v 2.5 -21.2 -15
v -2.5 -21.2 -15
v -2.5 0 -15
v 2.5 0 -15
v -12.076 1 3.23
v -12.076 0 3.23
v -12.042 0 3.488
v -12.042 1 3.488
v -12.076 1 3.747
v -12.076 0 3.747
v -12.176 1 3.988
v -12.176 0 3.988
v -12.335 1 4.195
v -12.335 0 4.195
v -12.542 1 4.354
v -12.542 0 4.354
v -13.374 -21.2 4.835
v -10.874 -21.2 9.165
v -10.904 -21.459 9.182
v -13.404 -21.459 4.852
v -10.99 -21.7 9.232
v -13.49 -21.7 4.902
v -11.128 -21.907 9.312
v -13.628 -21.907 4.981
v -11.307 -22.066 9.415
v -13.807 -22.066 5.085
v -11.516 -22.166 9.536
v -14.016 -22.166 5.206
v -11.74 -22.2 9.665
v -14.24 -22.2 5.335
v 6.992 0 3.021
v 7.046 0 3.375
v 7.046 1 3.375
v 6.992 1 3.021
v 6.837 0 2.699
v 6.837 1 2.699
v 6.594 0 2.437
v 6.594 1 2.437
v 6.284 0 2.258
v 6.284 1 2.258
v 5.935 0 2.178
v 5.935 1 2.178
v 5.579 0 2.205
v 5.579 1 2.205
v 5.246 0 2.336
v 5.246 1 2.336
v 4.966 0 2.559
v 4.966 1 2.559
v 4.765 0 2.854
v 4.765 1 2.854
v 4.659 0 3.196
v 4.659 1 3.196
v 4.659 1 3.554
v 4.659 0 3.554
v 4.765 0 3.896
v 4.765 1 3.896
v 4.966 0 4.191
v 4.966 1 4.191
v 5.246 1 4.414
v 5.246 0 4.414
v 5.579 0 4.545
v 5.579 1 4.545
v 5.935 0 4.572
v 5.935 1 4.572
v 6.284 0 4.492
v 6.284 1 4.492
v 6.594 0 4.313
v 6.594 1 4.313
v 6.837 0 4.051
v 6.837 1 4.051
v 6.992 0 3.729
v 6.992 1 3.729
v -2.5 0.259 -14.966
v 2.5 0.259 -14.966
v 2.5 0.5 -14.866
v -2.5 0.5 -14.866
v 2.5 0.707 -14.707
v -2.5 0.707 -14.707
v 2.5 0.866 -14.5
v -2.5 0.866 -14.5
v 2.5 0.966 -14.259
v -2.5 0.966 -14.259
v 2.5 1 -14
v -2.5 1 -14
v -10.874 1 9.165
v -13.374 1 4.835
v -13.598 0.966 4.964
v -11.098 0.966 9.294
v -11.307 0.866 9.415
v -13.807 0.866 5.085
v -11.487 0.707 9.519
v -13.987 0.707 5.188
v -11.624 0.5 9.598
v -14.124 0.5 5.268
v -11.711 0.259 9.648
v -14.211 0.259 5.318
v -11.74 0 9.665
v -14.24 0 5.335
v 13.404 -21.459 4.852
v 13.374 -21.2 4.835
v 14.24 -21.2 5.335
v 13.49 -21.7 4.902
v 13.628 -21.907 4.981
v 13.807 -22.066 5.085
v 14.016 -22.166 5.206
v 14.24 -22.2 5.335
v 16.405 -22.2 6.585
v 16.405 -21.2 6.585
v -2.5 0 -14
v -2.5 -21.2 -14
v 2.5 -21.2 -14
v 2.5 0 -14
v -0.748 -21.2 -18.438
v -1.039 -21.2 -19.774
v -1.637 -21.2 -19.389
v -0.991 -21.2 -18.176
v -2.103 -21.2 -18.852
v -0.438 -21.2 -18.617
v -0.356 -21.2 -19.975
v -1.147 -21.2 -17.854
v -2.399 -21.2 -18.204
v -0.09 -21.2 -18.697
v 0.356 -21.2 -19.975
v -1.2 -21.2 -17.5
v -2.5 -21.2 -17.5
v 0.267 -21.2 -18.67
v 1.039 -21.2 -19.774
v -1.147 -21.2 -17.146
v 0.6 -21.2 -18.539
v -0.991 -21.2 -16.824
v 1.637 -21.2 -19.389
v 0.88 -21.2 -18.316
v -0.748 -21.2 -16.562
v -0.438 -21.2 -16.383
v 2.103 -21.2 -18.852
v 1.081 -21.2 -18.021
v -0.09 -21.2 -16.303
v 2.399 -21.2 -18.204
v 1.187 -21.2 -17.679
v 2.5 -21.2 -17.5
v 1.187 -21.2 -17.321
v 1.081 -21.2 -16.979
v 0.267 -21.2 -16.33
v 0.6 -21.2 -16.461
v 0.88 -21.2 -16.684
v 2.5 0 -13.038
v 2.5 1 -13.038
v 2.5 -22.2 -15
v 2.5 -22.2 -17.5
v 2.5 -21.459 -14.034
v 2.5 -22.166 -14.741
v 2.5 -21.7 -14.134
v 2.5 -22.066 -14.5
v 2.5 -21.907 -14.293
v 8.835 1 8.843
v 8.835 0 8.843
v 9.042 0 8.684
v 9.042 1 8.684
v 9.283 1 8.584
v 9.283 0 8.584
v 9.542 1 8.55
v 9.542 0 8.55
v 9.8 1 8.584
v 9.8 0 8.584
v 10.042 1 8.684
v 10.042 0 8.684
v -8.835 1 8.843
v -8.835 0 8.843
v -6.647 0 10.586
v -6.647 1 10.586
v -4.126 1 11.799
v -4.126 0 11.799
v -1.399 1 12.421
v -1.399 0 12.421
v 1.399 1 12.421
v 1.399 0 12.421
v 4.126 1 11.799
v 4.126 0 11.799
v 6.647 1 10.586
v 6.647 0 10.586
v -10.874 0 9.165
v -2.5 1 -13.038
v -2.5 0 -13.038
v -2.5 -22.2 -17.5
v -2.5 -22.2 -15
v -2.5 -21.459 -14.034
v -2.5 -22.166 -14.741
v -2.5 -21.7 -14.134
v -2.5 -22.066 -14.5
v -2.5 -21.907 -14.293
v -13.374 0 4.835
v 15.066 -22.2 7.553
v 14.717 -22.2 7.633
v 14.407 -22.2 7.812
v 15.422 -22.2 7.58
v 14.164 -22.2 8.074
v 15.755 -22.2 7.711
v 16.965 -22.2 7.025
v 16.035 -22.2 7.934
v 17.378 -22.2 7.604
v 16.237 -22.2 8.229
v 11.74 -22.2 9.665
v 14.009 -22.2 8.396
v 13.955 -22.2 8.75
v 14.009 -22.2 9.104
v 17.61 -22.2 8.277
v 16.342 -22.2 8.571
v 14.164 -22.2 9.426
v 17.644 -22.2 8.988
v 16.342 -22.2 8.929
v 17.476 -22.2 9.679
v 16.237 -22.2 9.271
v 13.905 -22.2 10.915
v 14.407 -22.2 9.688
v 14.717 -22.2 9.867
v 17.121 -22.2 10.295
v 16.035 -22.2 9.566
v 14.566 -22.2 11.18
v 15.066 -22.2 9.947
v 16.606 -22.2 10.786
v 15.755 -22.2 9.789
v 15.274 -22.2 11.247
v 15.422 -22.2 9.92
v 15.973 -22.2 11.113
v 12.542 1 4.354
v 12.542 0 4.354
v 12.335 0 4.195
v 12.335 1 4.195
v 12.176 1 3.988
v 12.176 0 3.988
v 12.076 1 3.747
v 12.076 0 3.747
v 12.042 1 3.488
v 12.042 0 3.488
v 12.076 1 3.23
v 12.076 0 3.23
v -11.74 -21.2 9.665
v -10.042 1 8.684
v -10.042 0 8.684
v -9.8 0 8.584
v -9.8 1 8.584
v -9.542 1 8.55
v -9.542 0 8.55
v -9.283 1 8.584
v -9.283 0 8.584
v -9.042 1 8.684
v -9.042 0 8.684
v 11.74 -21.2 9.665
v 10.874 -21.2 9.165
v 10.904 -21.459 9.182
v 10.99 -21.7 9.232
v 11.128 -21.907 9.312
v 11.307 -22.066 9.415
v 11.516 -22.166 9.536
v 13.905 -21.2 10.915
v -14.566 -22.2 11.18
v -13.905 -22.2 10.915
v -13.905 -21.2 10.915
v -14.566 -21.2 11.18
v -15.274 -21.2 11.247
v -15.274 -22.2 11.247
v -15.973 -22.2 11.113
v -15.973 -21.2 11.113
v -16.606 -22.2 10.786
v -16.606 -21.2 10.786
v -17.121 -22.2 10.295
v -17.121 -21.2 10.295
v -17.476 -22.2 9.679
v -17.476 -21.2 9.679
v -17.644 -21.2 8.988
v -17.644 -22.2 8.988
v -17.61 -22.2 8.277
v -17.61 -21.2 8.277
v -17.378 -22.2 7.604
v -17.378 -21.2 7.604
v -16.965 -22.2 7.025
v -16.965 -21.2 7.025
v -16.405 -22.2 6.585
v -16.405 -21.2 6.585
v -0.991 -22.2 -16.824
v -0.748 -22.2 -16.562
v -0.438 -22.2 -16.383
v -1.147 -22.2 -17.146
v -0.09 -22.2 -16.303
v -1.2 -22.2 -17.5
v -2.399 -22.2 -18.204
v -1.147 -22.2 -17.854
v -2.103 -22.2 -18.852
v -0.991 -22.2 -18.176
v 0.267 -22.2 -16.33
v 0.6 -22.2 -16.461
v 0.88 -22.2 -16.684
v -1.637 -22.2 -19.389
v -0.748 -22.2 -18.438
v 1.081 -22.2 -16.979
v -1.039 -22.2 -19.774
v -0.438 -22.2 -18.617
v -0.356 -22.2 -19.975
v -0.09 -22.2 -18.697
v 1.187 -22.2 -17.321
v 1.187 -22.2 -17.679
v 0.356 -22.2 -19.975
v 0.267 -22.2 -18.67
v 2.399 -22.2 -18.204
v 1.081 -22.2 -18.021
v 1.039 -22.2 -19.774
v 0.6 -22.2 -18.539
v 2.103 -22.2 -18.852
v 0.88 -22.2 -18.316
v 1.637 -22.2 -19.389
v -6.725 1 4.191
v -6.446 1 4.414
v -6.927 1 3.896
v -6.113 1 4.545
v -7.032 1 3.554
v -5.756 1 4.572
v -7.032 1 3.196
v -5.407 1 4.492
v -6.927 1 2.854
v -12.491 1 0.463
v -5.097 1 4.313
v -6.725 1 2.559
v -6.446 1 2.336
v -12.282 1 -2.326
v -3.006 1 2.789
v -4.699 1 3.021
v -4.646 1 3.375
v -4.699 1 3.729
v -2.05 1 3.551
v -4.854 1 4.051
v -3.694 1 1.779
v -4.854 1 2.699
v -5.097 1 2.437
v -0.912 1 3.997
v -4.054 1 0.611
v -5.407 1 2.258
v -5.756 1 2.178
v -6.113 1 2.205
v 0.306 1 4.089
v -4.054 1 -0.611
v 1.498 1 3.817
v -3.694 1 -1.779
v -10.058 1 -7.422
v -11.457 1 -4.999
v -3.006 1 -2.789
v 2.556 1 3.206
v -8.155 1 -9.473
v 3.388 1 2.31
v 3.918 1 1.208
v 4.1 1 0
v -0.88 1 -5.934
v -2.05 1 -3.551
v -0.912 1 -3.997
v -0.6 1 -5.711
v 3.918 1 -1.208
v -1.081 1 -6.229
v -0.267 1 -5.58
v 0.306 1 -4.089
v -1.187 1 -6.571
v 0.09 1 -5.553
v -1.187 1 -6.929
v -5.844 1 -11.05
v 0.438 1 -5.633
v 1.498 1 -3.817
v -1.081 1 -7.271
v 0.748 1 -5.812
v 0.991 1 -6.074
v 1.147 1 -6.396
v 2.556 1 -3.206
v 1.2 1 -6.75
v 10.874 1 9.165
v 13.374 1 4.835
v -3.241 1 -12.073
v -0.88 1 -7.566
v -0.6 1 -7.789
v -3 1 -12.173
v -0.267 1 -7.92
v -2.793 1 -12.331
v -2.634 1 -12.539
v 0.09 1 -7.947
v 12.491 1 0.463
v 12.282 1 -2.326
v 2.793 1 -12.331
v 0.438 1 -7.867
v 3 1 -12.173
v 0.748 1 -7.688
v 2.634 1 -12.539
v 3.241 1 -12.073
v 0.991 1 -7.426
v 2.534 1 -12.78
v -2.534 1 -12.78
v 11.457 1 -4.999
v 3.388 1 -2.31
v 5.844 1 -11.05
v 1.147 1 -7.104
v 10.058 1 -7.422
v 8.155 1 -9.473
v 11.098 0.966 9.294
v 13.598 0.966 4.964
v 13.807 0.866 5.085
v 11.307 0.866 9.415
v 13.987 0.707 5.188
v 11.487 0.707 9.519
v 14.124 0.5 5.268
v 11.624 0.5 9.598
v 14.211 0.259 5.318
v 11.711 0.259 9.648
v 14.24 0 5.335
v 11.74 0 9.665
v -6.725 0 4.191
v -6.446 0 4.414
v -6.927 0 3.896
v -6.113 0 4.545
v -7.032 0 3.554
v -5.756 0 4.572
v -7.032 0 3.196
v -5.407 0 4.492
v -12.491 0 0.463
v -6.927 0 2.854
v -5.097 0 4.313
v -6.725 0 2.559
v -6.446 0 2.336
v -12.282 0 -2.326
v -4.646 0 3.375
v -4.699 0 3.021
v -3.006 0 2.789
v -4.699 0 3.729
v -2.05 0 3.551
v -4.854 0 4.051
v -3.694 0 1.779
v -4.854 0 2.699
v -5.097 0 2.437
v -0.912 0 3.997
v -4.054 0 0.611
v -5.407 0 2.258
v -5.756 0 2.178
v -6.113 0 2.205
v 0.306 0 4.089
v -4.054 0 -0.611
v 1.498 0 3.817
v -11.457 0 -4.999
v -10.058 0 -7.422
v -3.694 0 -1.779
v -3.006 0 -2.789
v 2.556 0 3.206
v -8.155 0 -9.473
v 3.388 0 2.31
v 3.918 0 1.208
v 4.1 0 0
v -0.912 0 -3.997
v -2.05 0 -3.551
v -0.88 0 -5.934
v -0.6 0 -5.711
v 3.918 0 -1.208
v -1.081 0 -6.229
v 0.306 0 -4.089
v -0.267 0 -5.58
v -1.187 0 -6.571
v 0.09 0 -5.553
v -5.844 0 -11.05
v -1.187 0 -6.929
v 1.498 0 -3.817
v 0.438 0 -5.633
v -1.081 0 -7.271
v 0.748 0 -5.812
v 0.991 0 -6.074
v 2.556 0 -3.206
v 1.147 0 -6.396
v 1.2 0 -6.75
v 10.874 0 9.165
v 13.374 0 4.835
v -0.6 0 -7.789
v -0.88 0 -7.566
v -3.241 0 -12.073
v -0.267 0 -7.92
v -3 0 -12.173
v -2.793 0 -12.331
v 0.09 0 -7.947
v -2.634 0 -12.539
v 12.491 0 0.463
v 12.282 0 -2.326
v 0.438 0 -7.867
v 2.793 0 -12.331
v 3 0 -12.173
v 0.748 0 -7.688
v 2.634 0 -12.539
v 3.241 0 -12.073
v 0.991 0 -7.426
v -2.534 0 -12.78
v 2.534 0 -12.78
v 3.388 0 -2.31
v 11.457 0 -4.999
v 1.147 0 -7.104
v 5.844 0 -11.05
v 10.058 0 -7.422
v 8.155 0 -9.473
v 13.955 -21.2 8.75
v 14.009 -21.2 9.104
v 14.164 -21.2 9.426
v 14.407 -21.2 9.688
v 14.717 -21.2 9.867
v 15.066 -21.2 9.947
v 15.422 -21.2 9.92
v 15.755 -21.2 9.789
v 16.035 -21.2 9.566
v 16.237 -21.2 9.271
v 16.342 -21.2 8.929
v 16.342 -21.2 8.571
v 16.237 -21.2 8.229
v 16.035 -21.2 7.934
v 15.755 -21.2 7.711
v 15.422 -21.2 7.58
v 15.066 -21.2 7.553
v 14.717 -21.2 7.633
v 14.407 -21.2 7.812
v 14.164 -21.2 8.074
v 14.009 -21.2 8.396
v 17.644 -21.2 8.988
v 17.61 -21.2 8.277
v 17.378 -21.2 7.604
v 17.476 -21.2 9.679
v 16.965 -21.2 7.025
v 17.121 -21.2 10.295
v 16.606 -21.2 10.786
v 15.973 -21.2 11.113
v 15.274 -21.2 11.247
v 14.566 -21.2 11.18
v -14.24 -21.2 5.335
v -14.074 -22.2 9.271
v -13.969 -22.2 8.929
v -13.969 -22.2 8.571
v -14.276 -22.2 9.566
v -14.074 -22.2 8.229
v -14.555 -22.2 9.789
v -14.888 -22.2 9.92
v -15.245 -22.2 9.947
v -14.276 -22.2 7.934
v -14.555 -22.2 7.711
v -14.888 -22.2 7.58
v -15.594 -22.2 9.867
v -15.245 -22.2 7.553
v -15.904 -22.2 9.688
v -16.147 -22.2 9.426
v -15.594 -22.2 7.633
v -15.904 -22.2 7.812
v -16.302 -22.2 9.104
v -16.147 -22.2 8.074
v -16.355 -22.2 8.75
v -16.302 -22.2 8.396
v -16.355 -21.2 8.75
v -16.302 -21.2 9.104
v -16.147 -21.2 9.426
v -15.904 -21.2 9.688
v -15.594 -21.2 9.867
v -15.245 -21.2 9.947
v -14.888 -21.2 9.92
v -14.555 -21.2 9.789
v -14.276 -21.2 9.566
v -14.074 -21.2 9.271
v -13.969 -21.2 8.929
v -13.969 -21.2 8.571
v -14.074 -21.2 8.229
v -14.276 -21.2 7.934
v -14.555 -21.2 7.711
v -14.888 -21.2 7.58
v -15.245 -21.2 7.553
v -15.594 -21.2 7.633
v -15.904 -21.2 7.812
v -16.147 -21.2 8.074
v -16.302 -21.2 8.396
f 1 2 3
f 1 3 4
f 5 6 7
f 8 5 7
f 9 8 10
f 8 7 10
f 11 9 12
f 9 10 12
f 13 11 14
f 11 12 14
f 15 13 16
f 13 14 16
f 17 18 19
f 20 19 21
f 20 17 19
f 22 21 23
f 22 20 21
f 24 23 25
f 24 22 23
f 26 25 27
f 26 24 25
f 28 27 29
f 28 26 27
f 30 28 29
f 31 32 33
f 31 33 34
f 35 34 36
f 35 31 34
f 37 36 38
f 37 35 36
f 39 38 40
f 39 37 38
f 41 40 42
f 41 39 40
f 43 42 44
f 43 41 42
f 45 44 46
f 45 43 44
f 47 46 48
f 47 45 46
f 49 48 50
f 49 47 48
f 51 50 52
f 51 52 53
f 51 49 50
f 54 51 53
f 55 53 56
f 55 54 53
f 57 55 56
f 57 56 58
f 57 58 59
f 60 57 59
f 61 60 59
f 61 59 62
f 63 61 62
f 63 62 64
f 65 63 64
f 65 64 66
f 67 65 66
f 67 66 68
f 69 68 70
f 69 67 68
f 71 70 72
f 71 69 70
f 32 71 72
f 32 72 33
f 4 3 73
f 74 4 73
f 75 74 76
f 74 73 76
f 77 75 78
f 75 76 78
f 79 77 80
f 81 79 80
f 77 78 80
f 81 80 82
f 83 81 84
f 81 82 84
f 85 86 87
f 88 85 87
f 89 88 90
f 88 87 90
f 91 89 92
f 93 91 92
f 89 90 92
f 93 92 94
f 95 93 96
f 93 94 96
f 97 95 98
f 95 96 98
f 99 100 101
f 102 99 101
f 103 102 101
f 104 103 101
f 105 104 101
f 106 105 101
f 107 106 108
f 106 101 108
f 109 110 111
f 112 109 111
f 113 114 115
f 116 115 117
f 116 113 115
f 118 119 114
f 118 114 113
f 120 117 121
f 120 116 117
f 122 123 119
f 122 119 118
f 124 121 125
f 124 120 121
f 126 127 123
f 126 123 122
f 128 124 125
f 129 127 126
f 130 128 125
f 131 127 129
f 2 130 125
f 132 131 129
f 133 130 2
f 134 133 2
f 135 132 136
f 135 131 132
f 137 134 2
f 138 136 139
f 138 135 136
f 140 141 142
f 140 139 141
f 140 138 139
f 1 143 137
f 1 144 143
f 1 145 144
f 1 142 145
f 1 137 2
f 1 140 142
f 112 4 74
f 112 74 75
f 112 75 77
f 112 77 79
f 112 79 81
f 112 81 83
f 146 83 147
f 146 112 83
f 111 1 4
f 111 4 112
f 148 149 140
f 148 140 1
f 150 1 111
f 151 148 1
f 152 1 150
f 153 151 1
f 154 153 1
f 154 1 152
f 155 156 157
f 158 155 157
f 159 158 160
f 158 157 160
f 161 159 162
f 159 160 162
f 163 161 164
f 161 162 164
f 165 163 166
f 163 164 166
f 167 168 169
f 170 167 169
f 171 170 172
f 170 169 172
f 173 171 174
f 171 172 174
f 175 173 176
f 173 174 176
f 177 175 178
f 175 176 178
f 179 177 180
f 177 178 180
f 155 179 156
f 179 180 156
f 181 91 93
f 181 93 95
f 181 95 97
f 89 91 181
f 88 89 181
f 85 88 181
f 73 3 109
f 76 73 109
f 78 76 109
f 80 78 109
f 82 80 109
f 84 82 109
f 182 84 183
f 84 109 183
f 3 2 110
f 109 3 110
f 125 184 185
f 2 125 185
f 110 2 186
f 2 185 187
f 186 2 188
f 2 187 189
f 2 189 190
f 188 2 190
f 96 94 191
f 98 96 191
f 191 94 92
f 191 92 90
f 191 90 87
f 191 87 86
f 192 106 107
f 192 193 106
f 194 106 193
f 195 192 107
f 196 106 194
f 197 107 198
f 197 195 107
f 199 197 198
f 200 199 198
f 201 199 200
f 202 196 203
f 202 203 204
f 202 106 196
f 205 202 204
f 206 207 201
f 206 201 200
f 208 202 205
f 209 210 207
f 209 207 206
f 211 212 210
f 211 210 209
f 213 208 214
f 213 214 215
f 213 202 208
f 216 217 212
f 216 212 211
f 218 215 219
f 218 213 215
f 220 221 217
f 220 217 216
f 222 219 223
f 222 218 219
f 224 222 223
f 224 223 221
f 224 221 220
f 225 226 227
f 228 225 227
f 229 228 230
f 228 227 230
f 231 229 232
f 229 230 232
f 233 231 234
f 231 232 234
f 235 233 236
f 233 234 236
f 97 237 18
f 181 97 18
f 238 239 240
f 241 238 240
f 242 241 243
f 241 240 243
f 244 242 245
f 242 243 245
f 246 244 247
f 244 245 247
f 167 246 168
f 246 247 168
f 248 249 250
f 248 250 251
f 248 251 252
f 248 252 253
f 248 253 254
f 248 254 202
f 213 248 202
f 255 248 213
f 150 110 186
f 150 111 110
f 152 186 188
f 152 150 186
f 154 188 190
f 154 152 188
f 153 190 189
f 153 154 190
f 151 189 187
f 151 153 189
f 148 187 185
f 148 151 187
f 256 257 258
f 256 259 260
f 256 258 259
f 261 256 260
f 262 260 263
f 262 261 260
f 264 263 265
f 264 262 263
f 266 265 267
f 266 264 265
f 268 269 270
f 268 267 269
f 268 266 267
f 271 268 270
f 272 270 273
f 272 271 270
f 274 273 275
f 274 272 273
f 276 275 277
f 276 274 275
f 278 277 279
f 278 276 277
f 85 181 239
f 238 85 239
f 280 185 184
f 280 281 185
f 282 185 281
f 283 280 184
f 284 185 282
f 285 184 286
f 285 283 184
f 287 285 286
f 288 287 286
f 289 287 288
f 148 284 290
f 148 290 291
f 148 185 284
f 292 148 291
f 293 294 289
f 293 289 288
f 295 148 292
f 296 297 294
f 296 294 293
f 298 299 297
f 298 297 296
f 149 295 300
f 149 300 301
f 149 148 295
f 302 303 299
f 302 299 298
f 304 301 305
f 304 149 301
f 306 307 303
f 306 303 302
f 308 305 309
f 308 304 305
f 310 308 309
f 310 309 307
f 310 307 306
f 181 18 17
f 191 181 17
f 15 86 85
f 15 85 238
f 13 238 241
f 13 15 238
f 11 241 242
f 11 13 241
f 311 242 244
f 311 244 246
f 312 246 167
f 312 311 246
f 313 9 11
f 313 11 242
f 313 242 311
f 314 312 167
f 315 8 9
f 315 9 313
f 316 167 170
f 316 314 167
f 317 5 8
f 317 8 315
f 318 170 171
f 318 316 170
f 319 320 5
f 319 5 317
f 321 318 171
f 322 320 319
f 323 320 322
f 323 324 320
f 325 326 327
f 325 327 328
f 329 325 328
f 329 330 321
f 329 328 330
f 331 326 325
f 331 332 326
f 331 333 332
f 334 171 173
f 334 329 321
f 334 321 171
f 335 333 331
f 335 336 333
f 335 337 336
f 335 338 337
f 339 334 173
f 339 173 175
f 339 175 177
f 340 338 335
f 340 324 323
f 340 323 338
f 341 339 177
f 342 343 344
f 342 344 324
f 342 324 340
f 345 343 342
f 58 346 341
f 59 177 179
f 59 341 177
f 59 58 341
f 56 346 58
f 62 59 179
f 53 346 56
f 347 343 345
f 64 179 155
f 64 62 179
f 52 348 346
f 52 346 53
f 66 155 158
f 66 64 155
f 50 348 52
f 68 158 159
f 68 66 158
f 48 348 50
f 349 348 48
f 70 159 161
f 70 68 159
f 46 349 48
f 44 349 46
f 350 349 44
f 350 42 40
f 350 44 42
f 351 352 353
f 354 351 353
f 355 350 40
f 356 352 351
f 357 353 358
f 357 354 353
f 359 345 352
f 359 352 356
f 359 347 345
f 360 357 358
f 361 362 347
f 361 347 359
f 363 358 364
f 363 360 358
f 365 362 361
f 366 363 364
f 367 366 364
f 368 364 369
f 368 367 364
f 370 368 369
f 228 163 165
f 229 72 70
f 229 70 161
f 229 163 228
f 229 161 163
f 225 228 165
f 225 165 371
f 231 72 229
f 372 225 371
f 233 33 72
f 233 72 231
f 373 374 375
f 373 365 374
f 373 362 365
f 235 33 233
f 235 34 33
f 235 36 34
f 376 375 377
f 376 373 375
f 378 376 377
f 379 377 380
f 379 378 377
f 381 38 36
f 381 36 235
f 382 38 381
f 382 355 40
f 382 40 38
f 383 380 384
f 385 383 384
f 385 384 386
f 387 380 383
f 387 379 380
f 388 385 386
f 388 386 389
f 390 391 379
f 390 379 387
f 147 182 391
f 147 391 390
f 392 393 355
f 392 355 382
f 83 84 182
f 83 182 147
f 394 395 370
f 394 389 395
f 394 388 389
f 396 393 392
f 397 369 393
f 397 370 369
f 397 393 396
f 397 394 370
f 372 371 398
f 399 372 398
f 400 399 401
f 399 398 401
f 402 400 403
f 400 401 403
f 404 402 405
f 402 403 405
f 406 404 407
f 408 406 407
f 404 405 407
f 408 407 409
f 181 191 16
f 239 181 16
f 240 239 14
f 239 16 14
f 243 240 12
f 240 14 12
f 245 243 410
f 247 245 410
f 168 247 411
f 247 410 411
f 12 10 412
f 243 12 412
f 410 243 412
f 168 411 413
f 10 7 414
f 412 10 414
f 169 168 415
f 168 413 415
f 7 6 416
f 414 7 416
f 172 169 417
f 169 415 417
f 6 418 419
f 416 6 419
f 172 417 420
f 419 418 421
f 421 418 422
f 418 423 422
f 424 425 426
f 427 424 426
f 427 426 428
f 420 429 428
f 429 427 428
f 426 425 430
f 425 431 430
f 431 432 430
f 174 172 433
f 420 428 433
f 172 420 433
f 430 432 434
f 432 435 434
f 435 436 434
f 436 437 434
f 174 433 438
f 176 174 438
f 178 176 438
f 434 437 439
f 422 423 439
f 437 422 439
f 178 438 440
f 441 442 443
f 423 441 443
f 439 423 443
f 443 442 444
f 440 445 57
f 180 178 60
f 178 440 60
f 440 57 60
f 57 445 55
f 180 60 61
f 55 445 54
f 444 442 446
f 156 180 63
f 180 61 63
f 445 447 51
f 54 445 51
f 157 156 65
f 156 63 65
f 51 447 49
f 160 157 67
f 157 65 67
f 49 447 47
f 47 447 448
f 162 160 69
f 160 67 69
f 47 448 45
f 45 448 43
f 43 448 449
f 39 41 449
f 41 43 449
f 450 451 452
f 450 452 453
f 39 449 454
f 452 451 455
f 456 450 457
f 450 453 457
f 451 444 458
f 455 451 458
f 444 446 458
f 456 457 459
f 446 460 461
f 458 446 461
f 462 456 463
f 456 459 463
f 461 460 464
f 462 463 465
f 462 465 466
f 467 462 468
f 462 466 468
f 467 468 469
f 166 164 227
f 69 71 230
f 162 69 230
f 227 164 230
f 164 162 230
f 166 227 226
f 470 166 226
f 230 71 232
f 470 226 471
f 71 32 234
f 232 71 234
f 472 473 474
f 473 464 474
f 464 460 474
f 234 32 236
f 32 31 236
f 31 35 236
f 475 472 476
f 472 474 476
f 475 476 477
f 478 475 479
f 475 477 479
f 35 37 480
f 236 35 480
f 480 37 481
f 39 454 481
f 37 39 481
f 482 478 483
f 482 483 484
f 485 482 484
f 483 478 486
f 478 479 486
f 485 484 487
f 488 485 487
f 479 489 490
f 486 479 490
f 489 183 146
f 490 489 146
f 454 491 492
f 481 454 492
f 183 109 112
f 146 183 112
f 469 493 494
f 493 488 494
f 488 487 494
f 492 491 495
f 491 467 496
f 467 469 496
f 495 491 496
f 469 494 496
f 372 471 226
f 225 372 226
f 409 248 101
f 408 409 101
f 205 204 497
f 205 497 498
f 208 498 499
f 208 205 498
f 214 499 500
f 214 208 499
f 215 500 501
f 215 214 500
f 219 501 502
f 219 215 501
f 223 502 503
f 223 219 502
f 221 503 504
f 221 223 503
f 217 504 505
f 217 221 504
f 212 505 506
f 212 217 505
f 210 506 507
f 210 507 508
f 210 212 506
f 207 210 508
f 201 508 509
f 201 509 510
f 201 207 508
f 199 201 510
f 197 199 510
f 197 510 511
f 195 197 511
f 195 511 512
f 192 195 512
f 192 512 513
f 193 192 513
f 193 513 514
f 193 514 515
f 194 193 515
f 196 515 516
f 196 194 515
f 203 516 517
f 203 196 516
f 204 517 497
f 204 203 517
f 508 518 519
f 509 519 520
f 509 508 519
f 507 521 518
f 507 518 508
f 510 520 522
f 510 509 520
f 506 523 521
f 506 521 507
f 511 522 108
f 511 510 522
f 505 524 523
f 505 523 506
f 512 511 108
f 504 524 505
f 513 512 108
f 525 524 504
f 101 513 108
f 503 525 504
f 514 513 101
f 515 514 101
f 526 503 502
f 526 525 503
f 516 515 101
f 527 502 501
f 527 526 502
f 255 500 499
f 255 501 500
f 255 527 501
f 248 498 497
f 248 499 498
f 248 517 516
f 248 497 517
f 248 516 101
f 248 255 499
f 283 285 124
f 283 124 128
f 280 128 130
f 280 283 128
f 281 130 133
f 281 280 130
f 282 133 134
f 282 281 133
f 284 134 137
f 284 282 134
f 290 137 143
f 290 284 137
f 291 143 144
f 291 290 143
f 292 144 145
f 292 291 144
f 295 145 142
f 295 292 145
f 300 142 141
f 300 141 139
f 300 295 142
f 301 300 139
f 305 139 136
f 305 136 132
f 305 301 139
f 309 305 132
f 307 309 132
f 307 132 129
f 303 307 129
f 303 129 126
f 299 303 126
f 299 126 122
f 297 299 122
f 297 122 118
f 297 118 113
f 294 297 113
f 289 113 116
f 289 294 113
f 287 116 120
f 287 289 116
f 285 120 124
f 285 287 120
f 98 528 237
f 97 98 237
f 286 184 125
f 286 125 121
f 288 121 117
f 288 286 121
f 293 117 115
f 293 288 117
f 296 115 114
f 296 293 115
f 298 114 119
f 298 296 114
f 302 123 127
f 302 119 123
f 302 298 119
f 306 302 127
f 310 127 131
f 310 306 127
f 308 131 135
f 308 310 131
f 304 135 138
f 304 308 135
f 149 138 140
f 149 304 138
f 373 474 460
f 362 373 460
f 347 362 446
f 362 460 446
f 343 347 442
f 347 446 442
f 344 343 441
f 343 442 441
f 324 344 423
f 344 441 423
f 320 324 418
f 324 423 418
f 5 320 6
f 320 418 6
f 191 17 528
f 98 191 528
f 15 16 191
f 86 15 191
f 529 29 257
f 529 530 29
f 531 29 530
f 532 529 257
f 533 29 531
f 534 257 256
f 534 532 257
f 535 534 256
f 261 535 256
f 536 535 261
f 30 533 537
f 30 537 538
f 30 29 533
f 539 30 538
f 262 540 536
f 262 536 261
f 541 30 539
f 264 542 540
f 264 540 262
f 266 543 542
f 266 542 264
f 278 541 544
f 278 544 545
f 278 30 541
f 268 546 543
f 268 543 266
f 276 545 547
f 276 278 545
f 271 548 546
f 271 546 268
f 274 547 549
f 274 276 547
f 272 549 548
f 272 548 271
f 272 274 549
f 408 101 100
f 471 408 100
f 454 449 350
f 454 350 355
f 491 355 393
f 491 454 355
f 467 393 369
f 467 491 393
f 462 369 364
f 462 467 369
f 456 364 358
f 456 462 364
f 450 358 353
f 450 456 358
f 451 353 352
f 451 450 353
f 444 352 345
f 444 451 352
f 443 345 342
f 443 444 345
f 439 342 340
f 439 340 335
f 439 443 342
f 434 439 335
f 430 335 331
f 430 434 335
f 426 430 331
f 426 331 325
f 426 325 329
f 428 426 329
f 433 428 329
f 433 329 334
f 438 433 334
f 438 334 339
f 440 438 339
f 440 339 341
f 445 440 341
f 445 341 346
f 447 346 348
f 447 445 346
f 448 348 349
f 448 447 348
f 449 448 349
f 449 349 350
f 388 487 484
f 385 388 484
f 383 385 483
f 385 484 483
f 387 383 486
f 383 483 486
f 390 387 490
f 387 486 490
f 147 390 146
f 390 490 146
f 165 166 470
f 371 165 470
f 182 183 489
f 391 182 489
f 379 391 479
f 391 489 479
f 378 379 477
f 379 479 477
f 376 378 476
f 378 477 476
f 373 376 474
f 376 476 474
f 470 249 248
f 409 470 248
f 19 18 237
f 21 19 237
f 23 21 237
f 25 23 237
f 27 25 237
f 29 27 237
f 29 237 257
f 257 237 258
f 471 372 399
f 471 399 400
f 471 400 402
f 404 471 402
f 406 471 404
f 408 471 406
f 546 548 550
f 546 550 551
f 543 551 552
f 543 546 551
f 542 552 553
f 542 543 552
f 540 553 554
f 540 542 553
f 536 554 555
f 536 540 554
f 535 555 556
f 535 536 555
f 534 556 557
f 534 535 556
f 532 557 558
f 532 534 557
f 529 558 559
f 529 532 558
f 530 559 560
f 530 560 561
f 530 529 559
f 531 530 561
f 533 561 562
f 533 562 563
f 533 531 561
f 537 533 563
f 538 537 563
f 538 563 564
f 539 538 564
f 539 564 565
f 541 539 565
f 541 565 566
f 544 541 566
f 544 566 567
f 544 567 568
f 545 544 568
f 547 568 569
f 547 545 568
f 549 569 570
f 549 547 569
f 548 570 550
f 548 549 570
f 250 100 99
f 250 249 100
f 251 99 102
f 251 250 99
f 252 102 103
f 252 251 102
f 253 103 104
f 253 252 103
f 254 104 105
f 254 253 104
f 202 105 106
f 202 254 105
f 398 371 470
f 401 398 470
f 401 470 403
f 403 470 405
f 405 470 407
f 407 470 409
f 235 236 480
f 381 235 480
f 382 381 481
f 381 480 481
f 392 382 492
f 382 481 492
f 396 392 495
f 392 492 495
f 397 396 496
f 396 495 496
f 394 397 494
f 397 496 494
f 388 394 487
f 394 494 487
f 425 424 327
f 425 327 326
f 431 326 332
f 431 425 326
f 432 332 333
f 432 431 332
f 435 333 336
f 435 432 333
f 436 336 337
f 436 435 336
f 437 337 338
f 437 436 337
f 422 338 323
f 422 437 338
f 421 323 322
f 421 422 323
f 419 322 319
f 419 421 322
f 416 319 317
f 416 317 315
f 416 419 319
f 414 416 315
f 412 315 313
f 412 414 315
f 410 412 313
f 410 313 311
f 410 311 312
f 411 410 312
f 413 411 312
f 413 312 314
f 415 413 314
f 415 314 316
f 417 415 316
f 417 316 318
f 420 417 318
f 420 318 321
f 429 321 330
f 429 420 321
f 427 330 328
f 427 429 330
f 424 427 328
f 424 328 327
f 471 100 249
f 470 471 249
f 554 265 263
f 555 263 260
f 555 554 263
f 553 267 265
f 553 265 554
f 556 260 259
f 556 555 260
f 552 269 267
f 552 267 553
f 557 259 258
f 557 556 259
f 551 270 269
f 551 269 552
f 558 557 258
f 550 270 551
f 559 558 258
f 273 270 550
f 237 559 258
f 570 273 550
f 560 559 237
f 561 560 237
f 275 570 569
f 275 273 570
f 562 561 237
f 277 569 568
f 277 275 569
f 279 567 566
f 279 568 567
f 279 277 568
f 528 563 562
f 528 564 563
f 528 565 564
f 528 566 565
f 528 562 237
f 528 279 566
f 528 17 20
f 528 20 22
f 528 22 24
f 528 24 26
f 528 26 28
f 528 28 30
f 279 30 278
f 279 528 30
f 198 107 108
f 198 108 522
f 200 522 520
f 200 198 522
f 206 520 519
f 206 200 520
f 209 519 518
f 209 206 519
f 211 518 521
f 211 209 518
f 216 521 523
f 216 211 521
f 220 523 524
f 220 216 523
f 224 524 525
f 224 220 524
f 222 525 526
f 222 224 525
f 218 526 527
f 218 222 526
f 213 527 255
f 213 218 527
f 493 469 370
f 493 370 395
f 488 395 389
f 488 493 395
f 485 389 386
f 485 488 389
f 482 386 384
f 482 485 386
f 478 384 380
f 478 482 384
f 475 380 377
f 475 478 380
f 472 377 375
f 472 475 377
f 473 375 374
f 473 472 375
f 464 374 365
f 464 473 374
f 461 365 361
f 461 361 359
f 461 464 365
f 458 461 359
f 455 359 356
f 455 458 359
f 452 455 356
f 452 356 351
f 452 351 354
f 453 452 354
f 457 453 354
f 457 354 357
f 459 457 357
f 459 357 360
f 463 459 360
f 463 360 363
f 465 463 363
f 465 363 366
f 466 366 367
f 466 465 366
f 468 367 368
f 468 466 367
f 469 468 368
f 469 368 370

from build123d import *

# Parameters (mm, degrees)
ESBO_O1_R                  = 4.1
ESBO_O1_R_2                = 1.2
RESSALTO_EXTRUS_O1_DEPTH   = 1
ESBO_O2_W                  = 5
ESBO_O2_H                  = 1
RESSALTO_EXTRUS_O2_DEPTH   = 22.2
ESBO_O3_R                  = 1.2
RESSALTO_EXTRUS_O3_DEPTH   = 1
FILETE1_R                  = 1
CONVERT_SOLID4_OUTLINE_R   = 1.2
CONVERT_SOLID4_OUTLINE_R_2 = 4.1
CONVERT_SOLID4_DEPTH       = 1
CONVERT_SOLID4_START       = -21.2
CONVERT_SOLID4_2_OUTLINE_W = 5
CONVERT_SOLID4_2_OUTLINE_H = 1
CONVERT_SOLID4_2_DEPTH     = 21.2
CONVERT_SOLID4_START_2     = -2.5
CONVERT_SOLID4_3_DEPTH     = 5
CONVERT_SOLID4_4_DEPTH     = 4.999999999
CONVERT_SOLID4_5_DEPTH     = 5
CUT_EXTRUDE1_START         = -1
SKETCH18_R                 = 1.2
CUT_EXTRUDE1_DEPTH         = 1


with BuildPart() as part:
    # Esboço1 → Ressalto-extrusão1 (new body)
    with BuildSketch(Plane(origin=(0, 0, 0), x_dir=(1, 0, 0), z_dir=(0, 1, 0))):
        with BuildLine():
            Line((-2.5, 15), (-2.5, 12.247448714))
            ThreePointArc((-2.5, 12.247448714), (-10.825317547, 6.25), (-11.856601718, -3.958660847))
            Line((-11.856601718, -3.958660847), (-14.240381057, -5.334936491))
            Line((-14.240381057, -5.334936491), (-11.740381057, -9.665063509))
            Line((-11.740381057, -9.665063509), (-9.356601718, -8.288787866))
            ThreePointArc((-9.356601718, -8.288787866), (0, -12.5), (9.356601718, -8.288787866))
            Line((9.356601718, -8.288787866), (11.740381057, -9.665063509))
            Line((11.740381057, -9.665063509), (14.240381057, -5.334936491))
            Line((14.240381057, -5.334936491), (11.856601718, -3.958660847))
            ThreePointArc((11.856601718, -3.958660847), (10.825317547, 6.25), (2.5, 12.247448714))
            Line((2.5, 12.247448714), (2.5, 15))
            Line((2.5, 15), (-2.5, 15))
        make_face()
        with Locations(Location((0, 0, 0), (0, 0, 270))):
            Circle(ESBO_O1_R, mode=Mode.SUBTRACT)
        with Locations(Location((0, 6.75, 0), (0, 0, 270))):
            Circle(ESBO_O1_R_2, mode=Mode.SUBTRACT)
        with Locations(Location((5.845671476, -3.375, 0), (0, 0, 270))):
            Circle(ESBO_O1_R_2, mode=Mode.SUBTRACT)
        with Locations(Location((-5.845671476, -3.375, 0), (0, 0, 270))):
            Circle(ESBO_O1_R_2, mode=Mode.SUBTRACT)
    extrude(amount=RESSALTO_EXTRUS_O1_DEPTH)

    # Esboço2 → Ressalto-extrusão2 (add)
    with BuildSketch(Plane.XZ):
        with Locations((0, -14.5)):
            Rectangle(ESBO_O2_W, ESBO_O2_H)
        Polygon((-10.874355653, 9.165063509), (-11.740381057, 9.665063509), (-14.240381057, 5.334936491), (-13.374355653, 4.834936491), align=None)
        Polygon((13.374355653, 4.834936491), (14.240381057, 5.334936491), (11.740381057, 9.665063509), (10.874355653, 9.165063509), align=None)
    extrude(amount=RESSALTO_EXTRUS_O2_DEPTH)

    # Esboço3 → Ressalto-extrusão3 (add)
    # profile 1 of 3: a face of its own
    with BuildSketch(Plane.XZ.offset(22.2)):
        with BuildLine():
            Line((2.5, -15), (2.5, -17.5))
            ThreePointArc((2.5, -17.5), (0, -20), (-2.5, -17.5))
            Line((-2.5, -17.5), (-2.5, -15))
            Line((-2.5, -15), (2.5, -15))
        make_face()
        with Locations(Location((0, -17.5, 0), (0, 0, 270))):
            Circle(ESBO_O3_R, mode=Mode.SUBTRACT)
    # profile 2 of 3: a face of its own
    with BuildSketch(Plane.XZ.offset(22.2)):
        with BuildLine():
            Line((-11.740381057, 9.665063509), (-13.905444566, 10.915063509))
            ThreePointArc((-13.905444566, 10.915063509), (-17.320508076, 10), (-16.405444566, 6.584936491))
            Line((-16.405444566, 6.584936491), (-14.240381057, 5.334936491))
            Line((-14.240381057, 5.334936491), (-11.740381057, 9.665063509))
        make_face()
        with Locations(Location((-15.155444566, 8.75, 0), (0, 0, 270))):
            Circle(ESBO_O3_R, mode=Mode.SUBTRACT)
    # profile 3 of 3: a face of its own
    with BuildSketch(Plane.XZ.offset(22.2)):
        with BuildLine():
            Line((14.240381057, 5.334936491), (16.405444566, 6.584936491))
            ThreePointArc((16.405444566, 6.584936491), (17.320508076, 10), (13.905444566, 10.915063509))
            Line((13.905444566, 10.915063509), (11.740381057, 9.665063509))
            Line((11.740381057, 9.665063509), (14.240381057, 5.334936491))
        make_face()
        with Locations(Location((15.155444566, 8.75, 0), (0, 0, 270))):
            Circle(ESBO_O3_R, mode=Mode.SUBTRACT)
    extrude(amount=-RESSALTO_EXTRUS_O3_DEPTH)

    # Filete1
    filete1_edges = [part.edges().sort_by_distance(p)[0] for p in [
        (11.856601718, 0.5, 3.958660847),
        (2.5, 0.5, -12.247448714),
        (-2.5, 0.5, -12.247448714),
        (-11.856601718, 0.5, 3.958660847),
        (9.356601718, 0.5, 8.288787866),
        (-9.356601718, 0.5, 8.288787866),
    ]]
    fillet(filete1_edges, radius=FILETE1_R)


with BuildPart() as body_2:
    # Convert-Solid4: read off the stored shape, not the designer's step
    # Convert-Solid4 outline → Convert-Solid4 (new body)
    with BuildSketch(Plane(origin=(0, 0, 0), x_dir=(1, 0, 0), z_dir=(0, 1, 0))):
        with BuildLine():
            Line((2.5, 14), (-2.5, 14))
            Line((-2.5, 14), (-2.5, 13.03840481))
            ThreePointArc((-2.5, 13.03840481), (-2.706507952, 12.429824191), (-3.240740741, 12.072597047))
            ThreePointArc((-3.240740741, 12.072597047), (-10.825317547, 6.25), (-12.075546102, -3.229734715))
            ThreePointArc((-12.075546102, -3.229734715), (-12.11779749, -3.871007453), (-12.541589791, -4.354138896))
            Line((-12.541589791, -4.354138896), (-13.374355653, -4.834936491))
            Line((-13.374355653, -4.834936491), (-10.874355653, -9.165063509))
            Line((-10.874355653, -9.165063509), (-10.041589791, -8.684265915))
            ThreePointArc((-10.041589791, -8.684265915), (-9.411289538, -8.558816738), (-8.834805362, -8.842862332))
            ThreePointArc((-8.834805362, -8.842862332), (0, -12.5), (8.834805362, -8.842862332))
            ThreePointArc((8.834805362, -8.842862332), (9.411289538, -8.558816738), (10.041589791, -8.684265915))
            Line((10.041589791, -8.684265915), (10.874355653, -9.165063509))
            Line((10.874355653, -9.165063509), (13.374355653, -4.834936491))
            Line((13.374355653, -4.834936491), (12.541589791, -4.354138896))
            ThreePointArc((12.541589791, -4.354138896), (12.11779749, -3.871007453), (12.075546102, -3.229734715))
            ThreePointArc((12.075546102, -3.229734715), (10.825317547, 6.25), (3.240740741, 12.072597047))
            ThreePointArc((3.240740741, 12.072597047), (2.706507952, 12.429824191), (2.5, 13.03840481))
            Line((2.5, 13.03840481), (2.5, 14))
        make_face()
        with Locations((-5.845671476, -3.375)):
            Circle(CONVERT_SOLID4_OUTLINE_R, mode=Mode.SUBTRACT)
        Circle(CONVERT_SOLID4_OUTLINE_R_2, mode=Mode.SUBTRACT)
        with Locations((5.845671476, -3.375)):
            Circle(CONVERT_SOLID4_OUTLINE_R, mode=Mode.SUBTRACT)
        with Locations((0, 6.75)):
            Circle(CONVERT_SOLID4_OUTLINE_R, mode=Mode.SUBTRACT)
    extrude(amount=CONVERT_SOLID4_DEPTH)

    # Convert-Solid4 2 outline → Convert-Solid4 2 (add)
    with BuildSketch(Plane(origin=(0, 0, 0), x_dir=(1, 0, 0), z_dir=(0, 1, 0)).offset(CONVERT_SOLID4_START)):
        with Locations((0, 14.5)):
            Rectangle(CONVERT_SOLID4_2_OUTLINE_W, CONVERT_SOLID4_2_OUTLINE_H)
        Polygon((-10.874355653, -9.165063509), (-13.374355653, -4.834936491), (-14.240381057, -5.334936491), (-11.740381057, -9.665063509), align=None)
        Polygon((14.240381057, -5.334936491), (13.374355653, -4.834936491), (10.874355653, -9.165063509), (11.740381057, -9.665063509), align=None)
    extrude(amount=CONVERT_SOLID4_2_DEPTH)

    # Convert-Solid4 3 outline → Convert-Solid4 3 (add)
    with BuildSketch(Plane.YZ.offset(CONVERT_SOLID4_START_2)):
        with BuildLine():
            Line((0, -14), (0, -15))
            ThreePointArc((0, -15), (0.707106781, -14.707106781), (1, -14))
            Line((1, -14), (0, -14))
        make_face()
    extrude(amount=CONVERT_SOLID4_3_DEPTH)

    # Convert-Solid4 4 outline → Convert-Solid4 4 (add)
    with BuildSketch(Plane(origin=(0, 0, 0), x_dir=(0.866025403784438, 0, -0.500000000000001), z_dir=(0.500000000000001, 0, 0.866025403784438)).offset(CONVERT_SOLID4_START_2)):
        with BuildLine():
            ThreePointArc((-14, 1), (-14.707106781, 0.707106781), (-15, 0))
            Line((-15, 0), (-14, 0))
            Line((-14, 0), (-14, 1))
        make_face()
    extrude(amount=CONVERT_SOLID4_4_DEPTH)

    # Convert-Solid4 5 outline → Convert-Solid4 5 (add)
    with BuildSketch(Plane(origin=(0, 0, 0), x_dir=(0.8660254037844386, 0, 0.4999999999999999), z_dir=(0.4999999999999999, 0, -0.8660254037844388)).offset(CONVERT_SOLID4_START_2)):
        with BuildLine():
            ThreePointArc((14, -1), (14.707106781, -0.707106781), (15, 0))
            Line((15, 0), (14, 0))
            Line((14, 0), (14, -1))
        make_face()
    extrude(amount=CONVERT_SOLID4_5_DEPTH)

    # Edge-Flange1: read off the stored shape, not the designer's step
    # Edge-Flange1: loft between two sections, ruled curve by curve
    edge_flange1_from = [
        Edge.make_three_point_arc((-2.5, -21.2, -14), (-2.5, -21.907106781, -14.292893219), (-2.5, -22.2, -15)),
        Edge.make_line((-2.5, -22.2, -15), (-2.5, -22.2, -20)),
        Edge.make_line((-2.5, -21.2, -20), (-2.5, -21.2, -15)),
        Edge.make_line((-2.5, -21.2, -20), (-2.5, -22.2, -20)),
        Edge.make_line((-2.5, -21.2, -15), (-2.5, -21.2, -14)),
    ]
    edge_flange1_to = [
        Edge.make_three_point_arc((2.5, -21.2, -14), (2.5, -21.907106781, -14.292893219), (2.5, -22.2, -15)),
        Edge.make_line((2.5, -22.2, -15), (2.5, -22.2, -20)),
        Edge.make_line((2.5, -21.2, -20), (2.5, -21.2, -15)),
        Edge.make_line((2.5, -21.2, -20), (2.5, -22.2, -20)),
        Edge.make_line((2.5, -21.2, -15), (2.5, -21.2, -14)),
    ]
    edge_flange1 = Solid(Shell([*[Face.make_surface_from_curves(edge_flange1_from[k], edge_flange1_to[k]) for k in range(5)], Face(Wire(edge_flange1_from)), Face(Wire(edge_flange1_to))]))
    add(edge_flange1)

    # Edge-Flange1 2: loft between two sections, ruled curve by curve
    edge_flange1_2_from = [
        Edge.make_three_point_arc((-10.874355653, -21.2, 9.165063509), (-11.128008621, -21.907106781, 9.311510119), (-11.740381057, -22.2, 9.665063509)),
        Edge.make_line((-11.740381057, -22.2, 9.665063509), (-16.070508076, -22.2, 12.165063509)),
        Edge.make_line((-16.070508076, -21.2, 12.165063509), (-11.740381057, -21.2, 9.665063509)),
        Edge.make_line((-16.070508076, -21.2, 12.165063509), (-16.070508076, -22.2, 12.165063509)),
        Edge.make_line((-11.740381057, -21.2, 9.665063509), (-10.874355653, -21.2, 9.165063509)),
    ]
    edge_flange1_2_to = [
        Edge.make_three_point_arc((-13.374355653, -21.2, 4.834936491), (-13.628008621, -21.907106781, 4.9813831), (-14.240381057, -22.2, 5.334936491)),
        Edge.make_line((-14.240381057, -22.2, 5.334936491), (-18.570508076, -22.2, 7.834936491)),
        Edge.make_line((-18.570508076, -21.2, 7.834936491), (-14.240381057, -21.2, 5.334936491)),
        Edge.make_line((-18.570508076, -21.2, 7.834936491), (-18.570508076, -22.2, 7.834936491)),
        Edge.make_line((-14.240381057, -21.2, 5.334936491), (-13.374355653, -21.2, 4.834936491)),
    ]
    edge_flange1_2 = Solid(Shell([*[Face.make_surface_from_curves(edge_flange1_2_from[k], edge_flange1_2_to[k]) for k in range(5)], Face(Wire(edge_flange1_2_from)), Face(Wire(edge_flange1_2_to))]))
    add(edge_flange1_2)

    # Edge-Flange1 3: loft between two sections, ruled curve by curve
    edge_flange1_3_from = [
        Edge.make_three_point_arc((13.374355653, -21.2, 4.834936491), (13.628008621, -21.907106781, 4.9813831), (14.240381057, -22.2, 5.334936491)),
        Edge.make_line((18.570508076, -21.2, 7.834936491), (18.570508076, -22.2, 7.834936491)),
        Edge.make_line((14.240381057, -22.2, 5.334936491), (18.570508076, -22.2, 7.834936491)),
        Edge.make_line((18.570508076, -21.2, 7.834936491), (14.240381057, -21.2, 5.334936491)),
        Edge.make_line((14.240381057, -21.2, 5.334936491), (13.374355653, -21.2, 4.834936491)),
    ]
    edge_flange1_3_to = [
        Edge.make_three_point_arc((10.874355653, -21.2, 9.165063509), (11.128008621, -21.907106781, 9.311510119), (11.740381057, -22.2, 9.665063509)),
        Edge.make_line((16.070508076, -21.2, 12.165063509), (16.070508076, -22.2, 12.165063509)),
        Edge.make_line((11.740381057, -22.2, 9.665063509), (16.070508076, -22.2, 12.165063509)),
        Edge.make_line((16.070508076, -21.2, 12.165063509), (11.740381057, -21.2, 9.665063509)),
        Edge.make_line((11.740381057, -21.2, 9.665063509), (10.874355653, -21.2, 9.165063509)),
    ]
    edge_flange1_3 = Solid(Shell([*[Face.make_surface_from_curves(edge_flange1_3_from[k], edge_flange1_3_to[k]) for k in range(5)], Face(Wire(edge_flange1_3_from)), Face(Wire(edge_flange1_3_to))]))
    add(edge_flange1_3)

    # Sketch18 → Cut-Extrude1 (cut)
    with BuildSketch(Plane(origin=(0, -21.2, 0), x_dir=(1, 0, 0), z_dir=(0, 1, 0)).offset(CUT_EXTRUDE1_START)):
        with Locations(Location((-15.155444566, -8.75, 0), (0, 0, 180))):
            Circle(SKETCH18_R)
        with Locations(Location((0, 17.5, 0), (0, 0, 180))):
            Circle(SKETCH18_R)
        with Locations(Location((15.155444566, -8.75, 0), (0, 0, 180))):
            Circle(SKETCH18_R)
        with BuildLine():
            Line((-16.405444566, -6.584936491), (-16.905444566, -5.718911087))
            Line((-16.905444566, -5.718911087), (-19.936533479, -7.468911087))
            Line((-19.936533479, -7.468911087), (-16.436533479, -13.531088913))
            Line((-16.436533479, -13.531088913), (-13.405444566, -11.781088913))
            Line((-13.405444566, -11.781088913), (-13.905444566, -10.915063509))
            ThreePointArc((-13.905444566, -10.915063509), (-17.320508076, -10), (-16.405444566, -6.584936491))
        make_face()
        with BuildLine():
            Line((2.5, 17.5), (3.5, 17.5))
            Line((3.5, 17.5), (3.5, 21))
            Line((3.5, 21), (-3.5, 21))
            Line((-3.5, 21), (-3.5, 17.5))
            Line((-3.5, 17.5), (-2.5, 17.5))
            ThreePointArc((-2.5, 17.5), (0, 20), (2.5, 17.5))
        make_face()
        with BuildLine():
            Line((13.905444566, -10.915063509), (13.405444566, -11.781088913))
            Line((13.405444566, -11.781088913), (16.436533479, -13.531088913))
            Line((16.436533479, -13.531088913), (19.936533479, -7.468911087))
            Line((19.936533479, -7.468911087), (16.905444566, -5.718911087))
            Line((16.905444566, -5.718911087), (16.405444566, -6.584936491))
            ThreePointArc((16.405444566, -6.584936491), (17.320508076, -10), (13.905444566, -10.915063509))
        make_face()
    extrude(amount=CUT_EXTRUDE1_DEPTH, mode=Mode.SUBTRACT)


solid = body_2.part
